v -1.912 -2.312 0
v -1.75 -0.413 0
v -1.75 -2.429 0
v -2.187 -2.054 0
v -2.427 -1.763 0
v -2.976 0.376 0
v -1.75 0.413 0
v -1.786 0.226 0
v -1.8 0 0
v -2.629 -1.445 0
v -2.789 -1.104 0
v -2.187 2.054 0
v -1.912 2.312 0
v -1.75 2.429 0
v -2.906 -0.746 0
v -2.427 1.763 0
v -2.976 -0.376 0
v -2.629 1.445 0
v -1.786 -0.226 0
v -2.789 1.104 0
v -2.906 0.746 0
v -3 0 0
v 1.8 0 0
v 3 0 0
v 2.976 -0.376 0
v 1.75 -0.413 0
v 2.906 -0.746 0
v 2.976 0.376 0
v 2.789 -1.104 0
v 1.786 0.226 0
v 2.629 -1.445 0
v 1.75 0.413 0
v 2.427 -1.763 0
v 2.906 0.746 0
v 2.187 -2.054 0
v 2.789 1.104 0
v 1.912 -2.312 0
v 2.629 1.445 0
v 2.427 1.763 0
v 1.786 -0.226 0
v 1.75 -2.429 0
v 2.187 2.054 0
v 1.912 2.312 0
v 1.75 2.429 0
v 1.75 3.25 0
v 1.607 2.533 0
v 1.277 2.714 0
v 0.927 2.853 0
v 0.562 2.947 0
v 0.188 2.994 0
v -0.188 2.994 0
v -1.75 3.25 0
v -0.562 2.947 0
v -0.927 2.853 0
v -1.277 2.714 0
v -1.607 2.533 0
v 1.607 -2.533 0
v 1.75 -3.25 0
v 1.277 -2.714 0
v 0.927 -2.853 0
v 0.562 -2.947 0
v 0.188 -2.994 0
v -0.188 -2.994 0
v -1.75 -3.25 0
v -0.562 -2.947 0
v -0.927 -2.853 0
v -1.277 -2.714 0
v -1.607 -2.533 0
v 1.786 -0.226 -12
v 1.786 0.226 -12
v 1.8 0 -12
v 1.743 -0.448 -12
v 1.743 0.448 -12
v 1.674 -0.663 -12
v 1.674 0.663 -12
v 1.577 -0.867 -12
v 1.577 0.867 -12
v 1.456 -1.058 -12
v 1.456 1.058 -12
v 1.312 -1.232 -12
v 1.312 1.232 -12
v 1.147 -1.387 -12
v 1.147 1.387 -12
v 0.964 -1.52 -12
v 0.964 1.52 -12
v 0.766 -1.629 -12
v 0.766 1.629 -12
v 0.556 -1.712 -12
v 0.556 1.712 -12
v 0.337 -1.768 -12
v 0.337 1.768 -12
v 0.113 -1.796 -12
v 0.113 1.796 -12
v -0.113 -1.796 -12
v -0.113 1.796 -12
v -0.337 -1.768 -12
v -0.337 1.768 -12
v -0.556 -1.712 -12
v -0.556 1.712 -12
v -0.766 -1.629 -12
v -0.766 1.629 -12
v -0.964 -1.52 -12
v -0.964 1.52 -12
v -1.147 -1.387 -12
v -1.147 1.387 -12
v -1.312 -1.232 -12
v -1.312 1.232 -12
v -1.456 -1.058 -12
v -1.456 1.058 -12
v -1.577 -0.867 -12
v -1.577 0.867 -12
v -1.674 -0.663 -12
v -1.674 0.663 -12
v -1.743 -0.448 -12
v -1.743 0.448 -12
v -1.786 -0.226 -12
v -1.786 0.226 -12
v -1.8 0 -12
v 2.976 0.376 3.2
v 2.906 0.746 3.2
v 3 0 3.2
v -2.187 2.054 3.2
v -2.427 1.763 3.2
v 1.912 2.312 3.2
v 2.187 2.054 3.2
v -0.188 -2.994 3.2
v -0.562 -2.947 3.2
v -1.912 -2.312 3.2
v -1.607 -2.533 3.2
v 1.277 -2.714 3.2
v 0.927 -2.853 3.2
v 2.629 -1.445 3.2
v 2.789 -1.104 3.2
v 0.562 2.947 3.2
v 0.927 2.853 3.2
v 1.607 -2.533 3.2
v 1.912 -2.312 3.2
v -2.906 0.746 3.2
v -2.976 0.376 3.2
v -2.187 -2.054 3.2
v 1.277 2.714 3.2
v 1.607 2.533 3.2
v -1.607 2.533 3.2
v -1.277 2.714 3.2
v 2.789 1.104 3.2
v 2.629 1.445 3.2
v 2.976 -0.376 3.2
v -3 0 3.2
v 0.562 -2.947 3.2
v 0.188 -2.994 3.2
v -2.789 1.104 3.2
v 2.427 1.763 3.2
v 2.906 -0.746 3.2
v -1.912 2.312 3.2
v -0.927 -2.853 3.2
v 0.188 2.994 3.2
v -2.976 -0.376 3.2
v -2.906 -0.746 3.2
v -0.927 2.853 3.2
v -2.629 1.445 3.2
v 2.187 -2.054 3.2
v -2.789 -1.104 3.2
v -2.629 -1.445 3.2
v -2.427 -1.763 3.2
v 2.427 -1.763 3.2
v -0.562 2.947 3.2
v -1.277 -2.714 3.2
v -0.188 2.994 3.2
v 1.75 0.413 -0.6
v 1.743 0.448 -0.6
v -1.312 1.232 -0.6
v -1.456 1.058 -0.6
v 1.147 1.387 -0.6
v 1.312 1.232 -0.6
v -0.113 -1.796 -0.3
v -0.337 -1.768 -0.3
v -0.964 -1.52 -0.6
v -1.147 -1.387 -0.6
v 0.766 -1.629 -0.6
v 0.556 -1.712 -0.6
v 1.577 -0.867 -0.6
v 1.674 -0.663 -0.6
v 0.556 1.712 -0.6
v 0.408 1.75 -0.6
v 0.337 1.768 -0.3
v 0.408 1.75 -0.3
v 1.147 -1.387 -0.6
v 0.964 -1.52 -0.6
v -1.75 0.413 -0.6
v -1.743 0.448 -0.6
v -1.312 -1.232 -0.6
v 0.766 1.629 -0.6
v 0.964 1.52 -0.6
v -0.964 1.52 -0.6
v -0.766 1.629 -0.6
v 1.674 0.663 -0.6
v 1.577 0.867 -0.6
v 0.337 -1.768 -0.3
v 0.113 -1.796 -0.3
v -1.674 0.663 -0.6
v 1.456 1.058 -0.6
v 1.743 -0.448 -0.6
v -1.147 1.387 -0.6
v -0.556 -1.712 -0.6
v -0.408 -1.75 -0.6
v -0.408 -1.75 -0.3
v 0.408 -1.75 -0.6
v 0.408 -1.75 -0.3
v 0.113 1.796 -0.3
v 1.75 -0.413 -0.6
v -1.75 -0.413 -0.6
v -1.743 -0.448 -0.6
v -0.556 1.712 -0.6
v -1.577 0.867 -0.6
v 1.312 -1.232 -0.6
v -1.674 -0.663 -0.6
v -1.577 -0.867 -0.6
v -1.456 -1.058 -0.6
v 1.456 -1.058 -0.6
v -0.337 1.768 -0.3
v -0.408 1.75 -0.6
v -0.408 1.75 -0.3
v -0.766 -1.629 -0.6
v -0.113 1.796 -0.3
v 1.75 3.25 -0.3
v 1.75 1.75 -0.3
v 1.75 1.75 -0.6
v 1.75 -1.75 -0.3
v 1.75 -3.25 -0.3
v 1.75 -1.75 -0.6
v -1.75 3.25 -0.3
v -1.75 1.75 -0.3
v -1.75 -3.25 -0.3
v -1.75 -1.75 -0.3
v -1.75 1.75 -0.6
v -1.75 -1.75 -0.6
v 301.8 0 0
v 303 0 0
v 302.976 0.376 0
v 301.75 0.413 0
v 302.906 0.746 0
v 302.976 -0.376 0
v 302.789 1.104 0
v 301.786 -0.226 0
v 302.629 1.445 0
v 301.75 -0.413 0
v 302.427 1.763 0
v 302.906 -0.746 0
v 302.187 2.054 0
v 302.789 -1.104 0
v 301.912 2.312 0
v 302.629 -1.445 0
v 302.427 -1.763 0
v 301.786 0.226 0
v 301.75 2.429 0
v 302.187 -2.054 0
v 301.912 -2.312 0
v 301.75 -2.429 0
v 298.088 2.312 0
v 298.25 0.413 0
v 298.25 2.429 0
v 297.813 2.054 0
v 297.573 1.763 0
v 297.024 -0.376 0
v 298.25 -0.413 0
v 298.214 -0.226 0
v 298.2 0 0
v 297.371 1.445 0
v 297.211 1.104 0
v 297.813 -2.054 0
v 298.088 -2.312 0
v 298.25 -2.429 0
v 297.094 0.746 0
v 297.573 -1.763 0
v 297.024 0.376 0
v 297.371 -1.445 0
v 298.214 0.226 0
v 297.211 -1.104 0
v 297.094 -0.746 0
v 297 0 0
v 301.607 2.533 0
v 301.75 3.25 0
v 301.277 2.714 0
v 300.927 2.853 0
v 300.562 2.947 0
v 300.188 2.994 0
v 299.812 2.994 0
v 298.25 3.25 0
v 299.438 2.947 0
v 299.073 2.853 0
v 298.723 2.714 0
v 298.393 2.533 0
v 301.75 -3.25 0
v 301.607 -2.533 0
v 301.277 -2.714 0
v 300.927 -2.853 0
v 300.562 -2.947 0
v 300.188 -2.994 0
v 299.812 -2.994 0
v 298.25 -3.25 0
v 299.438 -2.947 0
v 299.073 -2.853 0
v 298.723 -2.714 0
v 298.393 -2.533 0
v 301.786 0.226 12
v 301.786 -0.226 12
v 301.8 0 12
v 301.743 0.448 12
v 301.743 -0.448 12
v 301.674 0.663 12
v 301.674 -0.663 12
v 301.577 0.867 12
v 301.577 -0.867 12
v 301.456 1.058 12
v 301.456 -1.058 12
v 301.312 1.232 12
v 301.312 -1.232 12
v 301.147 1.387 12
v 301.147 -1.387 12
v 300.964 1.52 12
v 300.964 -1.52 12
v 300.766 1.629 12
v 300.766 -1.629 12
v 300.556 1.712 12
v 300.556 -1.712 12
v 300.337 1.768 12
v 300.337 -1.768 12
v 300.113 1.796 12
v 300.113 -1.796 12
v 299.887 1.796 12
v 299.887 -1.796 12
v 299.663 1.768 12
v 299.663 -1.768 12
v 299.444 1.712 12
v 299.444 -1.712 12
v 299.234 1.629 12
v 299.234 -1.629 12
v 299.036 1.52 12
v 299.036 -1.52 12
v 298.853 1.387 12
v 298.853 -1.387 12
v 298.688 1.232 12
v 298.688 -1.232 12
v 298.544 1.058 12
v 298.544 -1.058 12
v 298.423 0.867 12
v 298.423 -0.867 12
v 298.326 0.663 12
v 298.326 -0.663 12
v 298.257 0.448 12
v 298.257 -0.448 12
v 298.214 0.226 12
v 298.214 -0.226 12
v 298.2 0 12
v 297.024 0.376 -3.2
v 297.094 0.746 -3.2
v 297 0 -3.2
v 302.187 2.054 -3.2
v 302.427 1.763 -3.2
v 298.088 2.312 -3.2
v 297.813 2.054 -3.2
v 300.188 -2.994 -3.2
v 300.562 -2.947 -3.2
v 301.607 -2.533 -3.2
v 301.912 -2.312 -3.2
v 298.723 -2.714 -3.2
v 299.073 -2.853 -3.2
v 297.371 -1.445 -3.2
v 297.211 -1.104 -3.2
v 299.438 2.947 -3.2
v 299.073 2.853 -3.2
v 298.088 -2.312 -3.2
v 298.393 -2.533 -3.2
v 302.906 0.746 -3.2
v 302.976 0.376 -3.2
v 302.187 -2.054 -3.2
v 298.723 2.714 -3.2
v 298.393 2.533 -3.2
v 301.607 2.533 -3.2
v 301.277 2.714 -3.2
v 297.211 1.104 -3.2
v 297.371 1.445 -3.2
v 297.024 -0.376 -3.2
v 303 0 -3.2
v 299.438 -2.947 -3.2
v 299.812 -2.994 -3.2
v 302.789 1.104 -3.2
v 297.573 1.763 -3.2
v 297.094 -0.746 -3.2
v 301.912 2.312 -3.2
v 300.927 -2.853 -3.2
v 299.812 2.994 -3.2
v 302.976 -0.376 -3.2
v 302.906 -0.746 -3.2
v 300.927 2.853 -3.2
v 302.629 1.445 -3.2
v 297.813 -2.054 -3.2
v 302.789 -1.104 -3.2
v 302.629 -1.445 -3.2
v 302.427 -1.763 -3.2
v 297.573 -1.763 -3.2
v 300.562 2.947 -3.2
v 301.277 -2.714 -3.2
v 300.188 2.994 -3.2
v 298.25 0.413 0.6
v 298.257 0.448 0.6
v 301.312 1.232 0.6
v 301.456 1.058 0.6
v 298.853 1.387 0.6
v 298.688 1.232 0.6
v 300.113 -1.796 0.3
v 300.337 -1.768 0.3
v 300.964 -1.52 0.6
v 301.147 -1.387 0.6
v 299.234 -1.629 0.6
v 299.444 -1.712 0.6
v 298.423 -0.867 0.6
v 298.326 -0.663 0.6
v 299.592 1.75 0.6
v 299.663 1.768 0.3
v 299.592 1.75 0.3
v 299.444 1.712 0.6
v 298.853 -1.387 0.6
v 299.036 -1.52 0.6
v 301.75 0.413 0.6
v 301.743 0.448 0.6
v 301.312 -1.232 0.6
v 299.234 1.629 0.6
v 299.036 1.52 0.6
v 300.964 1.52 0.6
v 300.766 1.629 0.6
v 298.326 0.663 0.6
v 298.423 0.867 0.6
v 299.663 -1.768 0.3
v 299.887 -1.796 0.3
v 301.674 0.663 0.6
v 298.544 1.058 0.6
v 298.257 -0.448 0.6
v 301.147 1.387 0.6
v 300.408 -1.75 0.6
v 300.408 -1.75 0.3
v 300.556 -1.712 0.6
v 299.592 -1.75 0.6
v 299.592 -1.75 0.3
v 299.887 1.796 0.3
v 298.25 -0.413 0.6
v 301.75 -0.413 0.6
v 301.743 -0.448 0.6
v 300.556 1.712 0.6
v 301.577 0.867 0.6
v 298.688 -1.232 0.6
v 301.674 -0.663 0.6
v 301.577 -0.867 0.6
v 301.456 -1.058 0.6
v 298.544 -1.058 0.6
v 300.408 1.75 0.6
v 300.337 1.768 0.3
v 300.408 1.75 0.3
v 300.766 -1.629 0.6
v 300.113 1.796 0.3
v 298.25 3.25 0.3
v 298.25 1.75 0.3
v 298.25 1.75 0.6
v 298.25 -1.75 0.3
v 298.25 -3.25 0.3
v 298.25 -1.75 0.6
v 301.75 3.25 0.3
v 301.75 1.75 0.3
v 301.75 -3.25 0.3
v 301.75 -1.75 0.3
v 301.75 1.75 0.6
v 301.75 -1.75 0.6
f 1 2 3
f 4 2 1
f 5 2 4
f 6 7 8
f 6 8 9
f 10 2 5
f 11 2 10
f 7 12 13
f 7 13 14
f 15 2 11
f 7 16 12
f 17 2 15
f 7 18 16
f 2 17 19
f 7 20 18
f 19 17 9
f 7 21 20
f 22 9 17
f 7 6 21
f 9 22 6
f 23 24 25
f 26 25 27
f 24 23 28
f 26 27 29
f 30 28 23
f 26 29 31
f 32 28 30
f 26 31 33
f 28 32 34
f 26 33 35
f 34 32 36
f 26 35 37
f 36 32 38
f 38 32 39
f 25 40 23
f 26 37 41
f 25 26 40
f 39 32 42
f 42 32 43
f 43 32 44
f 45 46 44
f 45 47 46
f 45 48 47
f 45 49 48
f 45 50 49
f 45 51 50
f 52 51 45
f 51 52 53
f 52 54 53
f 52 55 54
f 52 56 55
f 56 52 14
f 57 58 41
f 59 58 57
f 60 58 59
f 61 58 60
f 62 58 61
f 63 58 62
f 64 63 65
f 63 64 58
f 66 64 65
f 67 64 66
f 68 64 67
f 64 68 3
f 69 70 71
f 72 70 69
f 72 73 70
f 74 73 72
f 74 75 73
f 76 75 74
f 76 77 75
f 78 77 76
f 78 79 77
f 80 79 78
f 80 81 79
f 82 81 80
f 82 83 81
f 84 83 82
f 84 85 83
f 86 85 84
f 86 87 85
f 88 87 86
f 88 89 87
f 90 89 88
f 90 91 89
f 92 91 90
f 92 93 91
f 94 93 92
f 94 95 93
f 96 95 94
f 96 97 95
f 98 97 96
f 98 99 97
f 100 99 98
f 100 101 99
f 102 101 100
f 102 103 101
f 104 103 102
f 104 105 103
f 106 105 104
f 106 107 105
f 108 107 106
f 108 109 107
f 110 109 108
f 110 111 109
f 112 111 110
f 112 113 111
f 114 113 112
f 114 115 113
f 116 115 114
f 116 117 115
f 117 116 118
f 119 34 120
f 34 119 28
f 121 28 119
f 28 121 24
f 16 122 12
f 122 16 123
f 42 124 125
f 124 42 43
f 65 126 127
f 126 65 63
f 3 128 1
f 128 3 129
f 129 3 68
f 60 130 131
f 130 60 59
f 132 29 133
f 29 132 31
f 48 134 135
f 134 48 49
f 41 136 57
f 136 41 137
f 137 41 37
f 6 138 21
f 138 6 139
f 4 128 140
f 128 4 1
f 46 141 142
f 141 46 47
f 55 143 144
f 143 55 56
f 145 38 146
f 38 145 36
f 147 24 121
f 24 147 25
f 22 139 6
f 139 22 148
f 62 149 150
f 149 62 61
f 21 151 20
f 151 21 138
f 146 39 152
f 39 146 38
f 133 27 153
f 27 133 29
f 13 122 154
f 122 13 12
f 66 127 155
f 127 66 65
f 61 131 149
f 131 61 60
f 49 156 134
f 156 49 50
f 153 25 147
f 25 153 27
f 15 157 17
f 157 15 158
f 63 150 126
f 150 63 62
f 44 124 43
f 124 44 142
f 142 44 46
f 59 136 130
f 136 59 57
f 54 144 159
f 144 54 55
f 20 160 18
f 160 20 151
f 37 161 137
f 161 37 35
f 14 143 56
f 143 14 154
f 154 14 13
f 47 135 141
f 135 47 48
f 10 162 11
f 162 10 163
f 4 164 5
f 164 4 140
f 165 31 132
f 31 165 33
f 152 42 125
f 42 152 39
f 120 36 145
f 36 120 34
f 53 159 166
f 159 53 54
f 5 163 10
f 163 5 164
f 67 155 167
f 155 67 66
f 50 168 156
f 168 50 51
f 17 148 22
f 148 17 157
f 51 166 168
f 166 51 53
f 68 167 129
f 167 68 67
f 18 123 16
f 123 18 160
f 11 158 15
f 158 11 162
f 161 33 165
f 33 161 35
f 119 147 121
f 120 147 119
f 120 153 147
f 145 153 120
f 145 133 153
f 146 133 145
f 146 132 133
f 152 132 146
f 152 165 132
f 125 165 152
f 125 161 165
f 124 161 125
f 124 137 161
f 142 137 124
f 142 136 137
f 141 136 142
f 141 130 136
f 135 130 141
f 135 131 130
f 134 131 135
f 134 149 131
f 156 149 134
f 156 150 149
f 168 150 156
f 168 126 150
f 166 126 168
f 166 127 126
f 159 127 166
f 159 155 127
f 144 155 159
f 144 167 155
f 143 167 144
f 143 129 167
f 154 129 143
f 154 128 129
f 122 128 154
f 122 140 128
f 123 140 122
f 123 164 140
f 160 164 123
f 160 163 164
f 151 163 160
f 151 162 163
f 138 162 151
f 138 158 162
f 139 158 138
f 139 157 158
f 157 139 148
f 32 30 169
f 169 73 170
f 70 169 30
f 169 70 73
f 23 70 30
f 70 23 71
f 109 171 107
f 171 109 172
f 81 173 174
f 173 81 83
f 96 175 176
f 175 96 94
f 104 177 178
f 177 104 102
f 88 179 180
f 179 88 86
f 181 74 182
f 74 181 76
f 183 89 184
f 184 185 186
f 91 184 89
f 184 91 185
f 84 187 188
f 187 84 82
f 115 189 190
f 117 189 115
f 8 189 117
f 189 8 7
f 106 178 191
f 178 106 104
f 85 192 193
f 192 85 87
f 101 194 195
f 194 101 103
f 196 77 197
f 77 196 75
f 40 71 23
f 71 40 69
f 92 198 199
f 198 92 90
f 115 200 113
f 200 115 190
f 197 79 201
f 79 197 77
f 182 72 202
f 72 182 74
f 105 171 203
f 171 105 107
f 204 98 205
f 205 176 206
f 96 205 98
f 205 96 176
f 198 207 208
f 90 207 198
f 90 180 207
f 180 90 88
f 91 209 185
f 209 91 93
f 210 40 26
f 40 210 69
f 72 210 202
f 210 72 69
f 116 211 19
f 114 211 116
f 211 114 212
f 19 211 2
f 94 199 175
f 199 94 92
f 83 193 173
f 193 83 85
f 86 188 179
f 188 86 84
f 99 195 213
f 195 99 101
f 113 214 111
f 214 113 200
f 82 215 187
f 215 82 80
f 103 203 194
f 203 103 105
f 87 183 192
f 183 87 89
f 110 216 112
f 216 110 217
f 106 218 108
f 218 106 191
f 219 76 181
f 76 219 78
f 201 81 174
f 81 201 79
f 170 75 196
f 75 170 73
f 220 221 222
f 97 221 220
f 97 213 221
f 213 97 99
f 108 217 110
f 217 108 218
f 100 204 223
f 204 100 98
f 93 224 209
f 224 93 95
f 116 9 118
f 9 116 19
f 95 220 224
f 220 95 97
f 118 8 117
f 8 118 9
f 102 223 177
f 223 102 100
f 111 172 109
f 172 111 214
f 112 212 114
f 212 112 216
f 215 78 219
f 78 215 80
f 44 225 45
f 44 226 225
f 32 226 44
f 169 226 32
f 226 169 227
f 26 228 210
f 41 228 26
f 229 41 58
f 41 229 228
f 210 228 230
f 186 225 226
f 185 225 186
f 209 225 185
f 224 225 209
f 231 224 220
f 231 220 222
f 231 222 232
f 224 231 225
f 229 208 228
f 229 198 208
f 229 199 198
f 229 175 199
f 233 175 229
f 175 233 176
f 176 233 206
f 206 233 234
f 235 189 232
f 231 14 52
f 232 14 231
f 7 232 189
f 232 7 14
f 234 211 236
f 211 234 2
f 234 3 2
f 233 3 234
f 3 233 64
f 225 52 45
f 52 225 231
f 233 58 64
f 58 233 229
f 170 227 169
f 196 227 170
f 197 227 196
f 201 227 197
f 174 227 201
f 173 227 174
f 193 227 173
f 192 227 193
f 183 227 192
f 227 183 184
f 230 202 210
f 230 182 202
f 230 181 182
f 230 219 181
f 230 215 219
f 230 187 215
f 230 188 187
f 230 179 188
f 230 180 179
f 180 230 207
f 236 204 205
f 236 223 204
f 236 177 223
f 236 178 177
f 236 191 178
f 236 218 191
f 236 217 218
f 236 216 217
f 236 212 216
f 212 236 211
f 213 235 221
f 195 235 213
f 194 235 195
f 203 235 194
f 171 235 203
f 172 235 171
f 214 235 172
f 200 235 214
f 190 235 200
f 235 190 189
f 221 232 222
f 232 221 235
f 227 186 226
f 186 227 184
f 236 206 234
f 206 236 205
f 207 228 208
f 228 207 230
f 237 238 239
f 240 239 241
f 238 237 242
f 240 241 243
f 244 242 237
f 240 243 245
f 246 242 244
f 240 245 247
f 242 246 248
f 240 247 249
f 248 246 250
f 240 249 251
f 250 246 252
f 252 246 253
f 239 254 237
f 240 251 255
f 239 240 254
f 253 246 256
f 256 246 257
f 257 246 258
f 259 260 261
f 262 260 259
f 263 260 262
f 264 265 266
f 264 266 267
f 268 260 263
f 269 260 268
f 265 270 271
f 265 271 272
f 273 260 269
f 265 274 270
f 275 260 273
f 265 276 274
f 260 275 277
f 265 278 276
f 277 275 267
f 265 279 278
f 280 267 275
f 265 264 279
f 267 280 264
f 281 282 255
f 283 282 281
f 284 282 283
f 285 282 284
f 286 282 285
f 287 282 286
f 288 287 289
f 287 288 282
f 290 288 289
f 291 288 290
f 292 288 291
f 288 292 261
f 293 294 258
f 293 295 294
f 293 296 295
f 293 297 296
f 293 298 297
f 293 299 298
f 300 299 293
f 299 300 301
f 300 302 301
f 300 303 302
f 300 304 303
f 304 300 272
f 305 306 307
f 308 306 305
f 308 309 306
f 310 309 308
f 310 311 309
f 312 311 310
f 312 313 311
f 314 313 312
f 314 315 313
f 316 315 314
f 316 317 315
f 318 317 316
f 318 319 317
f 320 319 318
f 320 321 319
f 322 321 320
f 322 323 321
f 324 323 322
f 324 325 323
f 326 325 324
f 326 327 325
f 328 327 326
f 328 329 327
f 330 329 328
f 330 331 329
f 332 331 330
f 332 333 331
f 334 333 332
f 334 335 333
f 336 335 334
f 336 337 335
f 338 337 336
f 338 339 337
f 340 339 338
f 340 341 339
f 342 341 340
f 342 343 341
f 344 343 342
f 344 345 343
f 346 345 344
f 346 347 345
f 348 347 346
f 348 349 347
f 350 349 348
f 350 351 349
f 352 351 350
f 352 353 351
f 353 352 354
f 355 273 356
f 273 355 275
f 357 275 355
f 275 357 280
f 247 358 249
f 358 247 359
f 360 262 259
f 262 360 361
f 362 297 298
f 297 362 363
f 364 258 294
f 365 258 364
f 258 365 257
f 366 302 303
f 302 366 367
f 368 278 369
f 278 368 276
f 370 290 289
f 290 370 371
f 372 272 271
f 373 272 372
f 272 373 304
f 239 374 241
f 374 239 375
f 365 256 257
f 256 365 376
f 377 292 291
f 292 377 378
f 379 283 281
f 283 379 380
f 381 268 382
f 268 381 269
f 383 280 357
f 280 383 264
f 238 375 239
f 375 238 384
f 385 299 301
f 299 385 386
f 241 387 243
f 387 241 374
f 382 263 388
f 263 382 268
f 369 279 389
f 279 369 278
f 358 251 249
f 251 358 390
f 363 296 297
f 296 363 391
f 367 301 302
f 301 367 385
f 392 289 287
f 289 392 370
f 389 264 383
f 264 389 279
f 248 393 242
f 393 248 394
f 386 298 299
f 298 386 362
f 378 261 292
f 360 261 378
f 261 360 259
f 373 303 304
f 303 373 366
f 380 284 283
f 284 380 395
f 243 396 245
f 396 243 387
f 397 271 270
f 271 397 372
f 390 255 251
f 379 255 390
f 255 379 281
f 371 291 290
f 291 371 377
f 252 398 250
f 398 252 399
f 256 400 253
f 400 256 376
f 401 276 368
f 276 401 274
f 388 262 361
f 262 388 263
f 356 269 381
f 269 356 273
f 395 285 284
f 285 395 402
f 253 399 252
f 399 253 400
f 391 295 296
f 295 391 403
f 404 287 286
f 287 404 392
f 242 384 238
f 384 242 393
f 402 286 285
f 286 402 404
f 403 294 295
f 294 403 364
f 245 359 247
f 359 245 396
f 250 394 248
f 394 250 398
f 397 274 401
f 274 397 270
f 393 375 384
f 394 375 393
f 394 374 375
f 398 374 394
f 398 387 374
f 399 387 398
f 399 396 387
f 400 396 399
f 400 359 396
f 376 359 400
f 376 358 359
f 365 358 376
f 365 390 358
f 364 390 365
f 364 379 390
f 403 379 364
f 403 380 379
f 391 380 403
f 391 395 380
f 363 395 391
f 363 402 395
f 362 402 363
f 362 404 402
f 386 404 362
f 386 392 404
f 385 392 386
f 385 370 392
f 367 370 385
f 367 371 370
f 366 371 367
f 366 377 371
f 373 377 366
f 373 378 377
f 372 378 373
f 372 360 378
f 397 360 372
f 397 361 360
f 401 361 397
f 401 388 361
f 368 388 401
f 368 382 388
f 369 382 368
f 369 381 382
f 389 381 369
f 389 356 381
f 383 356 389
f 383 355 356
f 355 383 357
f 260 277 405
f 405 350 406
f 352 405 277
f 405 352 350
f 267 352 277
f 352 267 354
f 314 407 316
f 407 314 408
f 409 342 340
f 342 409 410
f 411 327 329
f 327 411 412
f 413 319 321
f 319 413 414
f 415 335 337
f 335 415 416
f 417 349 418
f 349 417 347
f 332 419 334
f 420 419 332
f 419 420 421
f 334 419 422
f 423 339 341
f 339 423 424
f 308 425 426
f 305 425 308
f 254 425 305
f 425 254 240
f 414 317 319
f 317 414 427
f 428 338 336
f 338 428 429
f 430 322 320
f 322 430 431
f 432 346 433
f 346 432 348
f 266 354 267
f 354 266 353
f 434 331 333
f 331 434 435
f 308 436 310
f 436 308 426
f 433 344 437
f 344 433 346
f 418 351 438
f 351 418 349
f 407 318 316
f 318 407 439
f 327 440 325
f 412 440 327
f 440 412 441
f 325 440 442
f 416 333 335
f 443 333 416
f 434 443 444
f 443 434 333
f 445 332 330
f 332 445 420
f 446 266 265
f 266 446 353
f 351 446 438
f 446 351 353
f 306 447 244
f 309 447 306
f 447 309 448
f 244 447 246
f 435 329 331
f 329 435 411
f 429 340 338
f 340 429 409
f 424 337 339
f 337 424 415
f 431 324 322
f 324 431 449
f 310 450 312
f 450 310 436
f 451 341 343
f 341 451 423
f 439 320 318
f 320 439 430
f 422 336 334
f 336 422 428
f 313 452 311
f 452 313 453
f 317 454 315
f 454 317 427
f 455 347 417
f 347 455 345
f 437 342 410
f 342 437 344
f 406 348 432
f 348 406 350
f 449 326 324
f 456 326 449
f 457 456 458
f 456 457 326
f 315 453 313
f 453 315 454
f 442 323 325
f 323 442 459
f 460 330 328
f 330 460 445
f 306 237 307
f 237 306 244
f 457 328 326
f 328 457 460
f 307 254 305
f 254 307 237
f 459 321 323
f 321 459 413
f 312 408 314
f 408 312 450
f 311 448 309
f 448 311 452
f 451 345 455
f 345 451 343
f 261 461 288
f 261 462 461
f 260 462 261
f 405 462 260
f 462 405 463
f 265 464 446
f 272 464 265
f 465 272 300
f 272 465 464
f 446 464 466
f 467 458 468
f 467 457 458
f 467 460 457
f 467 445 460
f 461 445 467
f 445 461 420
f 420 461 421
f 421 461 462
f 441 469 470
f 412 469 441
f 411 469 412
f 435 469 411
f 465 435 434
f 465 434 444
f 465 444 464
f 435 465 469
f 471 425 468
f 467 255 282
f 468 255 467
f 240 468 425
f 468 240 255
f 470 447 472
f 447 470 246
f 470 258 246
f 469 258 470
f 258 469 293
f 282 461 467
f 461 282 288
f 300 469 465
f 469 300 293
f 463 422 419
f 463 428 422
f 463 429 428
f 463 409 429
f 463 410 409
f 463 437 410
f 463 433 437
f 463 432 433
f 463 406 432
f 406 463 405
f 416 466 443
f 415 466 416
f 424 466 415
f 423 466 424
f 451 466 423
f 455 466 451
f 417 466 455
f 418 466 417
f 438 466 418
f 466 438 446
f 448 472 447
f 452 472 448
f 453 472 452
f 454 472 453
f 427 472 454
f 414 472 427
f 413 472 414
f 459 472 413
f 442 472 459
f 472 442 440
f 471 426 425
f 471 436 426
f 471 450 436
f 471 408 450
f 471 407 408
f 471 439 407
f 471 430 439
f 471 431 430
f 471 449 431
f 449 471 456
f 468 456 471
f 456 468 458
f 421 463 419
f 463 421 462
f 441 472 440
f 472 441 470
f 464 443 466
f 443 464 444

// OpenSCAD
$fn = 50;


difference() {
	union() {
		translate(v = [0, 0, 0]) {
			rotate(a = [0, 0, 0]) {
				difference() {
					union() {
						translate(v = [0, 0, -12.0000000000]) {
							cylinder(h = 12.0000000000, r = 1.5000000000);
						}
						cylinder(h = 3.2000000000, r = 3.0000000000);
						translate(v = [0, 0, -12.0000000000]) {
							cylinder(h = 12.0000000000, r = 1.8000000000);
						}
						translate(v = [-1.7500000000, -3.2500000000, -0.3000000000]) {
							cube(size = [3.5000000000, 6.5000000000, 0.3000000000]);
						}
						translate(v = [-1.7500000000, -1.7500000000, -0.6000000000]) {
							cube(size = [3.5000000000, 3.5000000000, 0.3000000000]);
						}
						translate(v = [0, 0, -12.0000000000]) {
							cylinder(h = 12.0000000000, r = 1.5000000000);
						}
					}
					union();
				}
			}
		}
		translate(v = [300, 0, 0]) {
			rotate(a = [0, 180, 0]) {
				difference() {
					union() {
						translate(v = [0, 0, -12.0000000000]) {
							cylinder(h = 12.0000000000, r = 1.5000000000);
						}
						cylinder(h = 3.2000000000, r = 3.0000000000);
						translate(v = [0, 0, -12.0000000000]) {
							cylinder(h = 12.0000000000, r = 1.8000000000);
						}
						translate(v = [-1.7500000000, -3.2500000000, -0.3000000000]) {
							cube(size = [3.5000000000, 6.5000000000, 0.3000000000]);
						}
						translate(v = [-1.7500000000, -1.7500000000, -0.6000000000]) {
							cube(size = [3.5000000000, 3.5000000000, 0.3000000000]);
						}
						translate(v = [0, 0, -12.0000000000]) {
							cylinder(h = 12.0000000000, r = 1.5000000000);
						}
					}
					union();
				}
			}
		}
		*color(alpha = 1.0000000000, c = "gray") {
			translate(v = [0, 14, 0]) {
				linear_extrude(height = 1) {
					text(font = "Arial:style=Bold", halign = "center", size = 4.5000000000, text = "COMMENT oobb_screw_socket_cap_shape_m3_radius_name_12_mm_depth", valign = "center");
				}
			}
		}
		*color(alpha = 1.0000000000, c = "gray") {
			translate(v = [0, 14, 0]) {
				linear_extrude(height = 1) {
					text(font = "Arial:style=Bold", halign = "center", size = 4.5000000000, text = "COMMENT description oobb_screw_socket_cap_shape_p_type_m3_radius_name_12.0_depth", valign = "center");
				}
			}
		}
		*color(alpha = 1.0000000000, c = "gray") {
			translate(v = [300, 14, 0]) {
				linear_extrude(height = 1) {
					text(font = "Arial:style=Bold", halign = "center", size = 4.5000000000, text = "COMMENT oobb_screw_socket_cap_shape_m3_radius_name_12_mm_depth rot_y : 180", valign = "center");
				}
			}
		}
		*color(alpha = 1.0000000000, c = "gray") {
			translate(v = [300, 14, 0]) {
				linear_extrude(height = 1) {
					text(font = "Arial:style=Bold", halign = "center", size = 4.5000000000, text = "COMMENT description oobb_screw_socket_cap_shape_p_type_m3_radius_name_12.0_depth_300_0_0_pos_180_rot_y", valign = "center");
				}
			}
		}
	}
	union();
}
